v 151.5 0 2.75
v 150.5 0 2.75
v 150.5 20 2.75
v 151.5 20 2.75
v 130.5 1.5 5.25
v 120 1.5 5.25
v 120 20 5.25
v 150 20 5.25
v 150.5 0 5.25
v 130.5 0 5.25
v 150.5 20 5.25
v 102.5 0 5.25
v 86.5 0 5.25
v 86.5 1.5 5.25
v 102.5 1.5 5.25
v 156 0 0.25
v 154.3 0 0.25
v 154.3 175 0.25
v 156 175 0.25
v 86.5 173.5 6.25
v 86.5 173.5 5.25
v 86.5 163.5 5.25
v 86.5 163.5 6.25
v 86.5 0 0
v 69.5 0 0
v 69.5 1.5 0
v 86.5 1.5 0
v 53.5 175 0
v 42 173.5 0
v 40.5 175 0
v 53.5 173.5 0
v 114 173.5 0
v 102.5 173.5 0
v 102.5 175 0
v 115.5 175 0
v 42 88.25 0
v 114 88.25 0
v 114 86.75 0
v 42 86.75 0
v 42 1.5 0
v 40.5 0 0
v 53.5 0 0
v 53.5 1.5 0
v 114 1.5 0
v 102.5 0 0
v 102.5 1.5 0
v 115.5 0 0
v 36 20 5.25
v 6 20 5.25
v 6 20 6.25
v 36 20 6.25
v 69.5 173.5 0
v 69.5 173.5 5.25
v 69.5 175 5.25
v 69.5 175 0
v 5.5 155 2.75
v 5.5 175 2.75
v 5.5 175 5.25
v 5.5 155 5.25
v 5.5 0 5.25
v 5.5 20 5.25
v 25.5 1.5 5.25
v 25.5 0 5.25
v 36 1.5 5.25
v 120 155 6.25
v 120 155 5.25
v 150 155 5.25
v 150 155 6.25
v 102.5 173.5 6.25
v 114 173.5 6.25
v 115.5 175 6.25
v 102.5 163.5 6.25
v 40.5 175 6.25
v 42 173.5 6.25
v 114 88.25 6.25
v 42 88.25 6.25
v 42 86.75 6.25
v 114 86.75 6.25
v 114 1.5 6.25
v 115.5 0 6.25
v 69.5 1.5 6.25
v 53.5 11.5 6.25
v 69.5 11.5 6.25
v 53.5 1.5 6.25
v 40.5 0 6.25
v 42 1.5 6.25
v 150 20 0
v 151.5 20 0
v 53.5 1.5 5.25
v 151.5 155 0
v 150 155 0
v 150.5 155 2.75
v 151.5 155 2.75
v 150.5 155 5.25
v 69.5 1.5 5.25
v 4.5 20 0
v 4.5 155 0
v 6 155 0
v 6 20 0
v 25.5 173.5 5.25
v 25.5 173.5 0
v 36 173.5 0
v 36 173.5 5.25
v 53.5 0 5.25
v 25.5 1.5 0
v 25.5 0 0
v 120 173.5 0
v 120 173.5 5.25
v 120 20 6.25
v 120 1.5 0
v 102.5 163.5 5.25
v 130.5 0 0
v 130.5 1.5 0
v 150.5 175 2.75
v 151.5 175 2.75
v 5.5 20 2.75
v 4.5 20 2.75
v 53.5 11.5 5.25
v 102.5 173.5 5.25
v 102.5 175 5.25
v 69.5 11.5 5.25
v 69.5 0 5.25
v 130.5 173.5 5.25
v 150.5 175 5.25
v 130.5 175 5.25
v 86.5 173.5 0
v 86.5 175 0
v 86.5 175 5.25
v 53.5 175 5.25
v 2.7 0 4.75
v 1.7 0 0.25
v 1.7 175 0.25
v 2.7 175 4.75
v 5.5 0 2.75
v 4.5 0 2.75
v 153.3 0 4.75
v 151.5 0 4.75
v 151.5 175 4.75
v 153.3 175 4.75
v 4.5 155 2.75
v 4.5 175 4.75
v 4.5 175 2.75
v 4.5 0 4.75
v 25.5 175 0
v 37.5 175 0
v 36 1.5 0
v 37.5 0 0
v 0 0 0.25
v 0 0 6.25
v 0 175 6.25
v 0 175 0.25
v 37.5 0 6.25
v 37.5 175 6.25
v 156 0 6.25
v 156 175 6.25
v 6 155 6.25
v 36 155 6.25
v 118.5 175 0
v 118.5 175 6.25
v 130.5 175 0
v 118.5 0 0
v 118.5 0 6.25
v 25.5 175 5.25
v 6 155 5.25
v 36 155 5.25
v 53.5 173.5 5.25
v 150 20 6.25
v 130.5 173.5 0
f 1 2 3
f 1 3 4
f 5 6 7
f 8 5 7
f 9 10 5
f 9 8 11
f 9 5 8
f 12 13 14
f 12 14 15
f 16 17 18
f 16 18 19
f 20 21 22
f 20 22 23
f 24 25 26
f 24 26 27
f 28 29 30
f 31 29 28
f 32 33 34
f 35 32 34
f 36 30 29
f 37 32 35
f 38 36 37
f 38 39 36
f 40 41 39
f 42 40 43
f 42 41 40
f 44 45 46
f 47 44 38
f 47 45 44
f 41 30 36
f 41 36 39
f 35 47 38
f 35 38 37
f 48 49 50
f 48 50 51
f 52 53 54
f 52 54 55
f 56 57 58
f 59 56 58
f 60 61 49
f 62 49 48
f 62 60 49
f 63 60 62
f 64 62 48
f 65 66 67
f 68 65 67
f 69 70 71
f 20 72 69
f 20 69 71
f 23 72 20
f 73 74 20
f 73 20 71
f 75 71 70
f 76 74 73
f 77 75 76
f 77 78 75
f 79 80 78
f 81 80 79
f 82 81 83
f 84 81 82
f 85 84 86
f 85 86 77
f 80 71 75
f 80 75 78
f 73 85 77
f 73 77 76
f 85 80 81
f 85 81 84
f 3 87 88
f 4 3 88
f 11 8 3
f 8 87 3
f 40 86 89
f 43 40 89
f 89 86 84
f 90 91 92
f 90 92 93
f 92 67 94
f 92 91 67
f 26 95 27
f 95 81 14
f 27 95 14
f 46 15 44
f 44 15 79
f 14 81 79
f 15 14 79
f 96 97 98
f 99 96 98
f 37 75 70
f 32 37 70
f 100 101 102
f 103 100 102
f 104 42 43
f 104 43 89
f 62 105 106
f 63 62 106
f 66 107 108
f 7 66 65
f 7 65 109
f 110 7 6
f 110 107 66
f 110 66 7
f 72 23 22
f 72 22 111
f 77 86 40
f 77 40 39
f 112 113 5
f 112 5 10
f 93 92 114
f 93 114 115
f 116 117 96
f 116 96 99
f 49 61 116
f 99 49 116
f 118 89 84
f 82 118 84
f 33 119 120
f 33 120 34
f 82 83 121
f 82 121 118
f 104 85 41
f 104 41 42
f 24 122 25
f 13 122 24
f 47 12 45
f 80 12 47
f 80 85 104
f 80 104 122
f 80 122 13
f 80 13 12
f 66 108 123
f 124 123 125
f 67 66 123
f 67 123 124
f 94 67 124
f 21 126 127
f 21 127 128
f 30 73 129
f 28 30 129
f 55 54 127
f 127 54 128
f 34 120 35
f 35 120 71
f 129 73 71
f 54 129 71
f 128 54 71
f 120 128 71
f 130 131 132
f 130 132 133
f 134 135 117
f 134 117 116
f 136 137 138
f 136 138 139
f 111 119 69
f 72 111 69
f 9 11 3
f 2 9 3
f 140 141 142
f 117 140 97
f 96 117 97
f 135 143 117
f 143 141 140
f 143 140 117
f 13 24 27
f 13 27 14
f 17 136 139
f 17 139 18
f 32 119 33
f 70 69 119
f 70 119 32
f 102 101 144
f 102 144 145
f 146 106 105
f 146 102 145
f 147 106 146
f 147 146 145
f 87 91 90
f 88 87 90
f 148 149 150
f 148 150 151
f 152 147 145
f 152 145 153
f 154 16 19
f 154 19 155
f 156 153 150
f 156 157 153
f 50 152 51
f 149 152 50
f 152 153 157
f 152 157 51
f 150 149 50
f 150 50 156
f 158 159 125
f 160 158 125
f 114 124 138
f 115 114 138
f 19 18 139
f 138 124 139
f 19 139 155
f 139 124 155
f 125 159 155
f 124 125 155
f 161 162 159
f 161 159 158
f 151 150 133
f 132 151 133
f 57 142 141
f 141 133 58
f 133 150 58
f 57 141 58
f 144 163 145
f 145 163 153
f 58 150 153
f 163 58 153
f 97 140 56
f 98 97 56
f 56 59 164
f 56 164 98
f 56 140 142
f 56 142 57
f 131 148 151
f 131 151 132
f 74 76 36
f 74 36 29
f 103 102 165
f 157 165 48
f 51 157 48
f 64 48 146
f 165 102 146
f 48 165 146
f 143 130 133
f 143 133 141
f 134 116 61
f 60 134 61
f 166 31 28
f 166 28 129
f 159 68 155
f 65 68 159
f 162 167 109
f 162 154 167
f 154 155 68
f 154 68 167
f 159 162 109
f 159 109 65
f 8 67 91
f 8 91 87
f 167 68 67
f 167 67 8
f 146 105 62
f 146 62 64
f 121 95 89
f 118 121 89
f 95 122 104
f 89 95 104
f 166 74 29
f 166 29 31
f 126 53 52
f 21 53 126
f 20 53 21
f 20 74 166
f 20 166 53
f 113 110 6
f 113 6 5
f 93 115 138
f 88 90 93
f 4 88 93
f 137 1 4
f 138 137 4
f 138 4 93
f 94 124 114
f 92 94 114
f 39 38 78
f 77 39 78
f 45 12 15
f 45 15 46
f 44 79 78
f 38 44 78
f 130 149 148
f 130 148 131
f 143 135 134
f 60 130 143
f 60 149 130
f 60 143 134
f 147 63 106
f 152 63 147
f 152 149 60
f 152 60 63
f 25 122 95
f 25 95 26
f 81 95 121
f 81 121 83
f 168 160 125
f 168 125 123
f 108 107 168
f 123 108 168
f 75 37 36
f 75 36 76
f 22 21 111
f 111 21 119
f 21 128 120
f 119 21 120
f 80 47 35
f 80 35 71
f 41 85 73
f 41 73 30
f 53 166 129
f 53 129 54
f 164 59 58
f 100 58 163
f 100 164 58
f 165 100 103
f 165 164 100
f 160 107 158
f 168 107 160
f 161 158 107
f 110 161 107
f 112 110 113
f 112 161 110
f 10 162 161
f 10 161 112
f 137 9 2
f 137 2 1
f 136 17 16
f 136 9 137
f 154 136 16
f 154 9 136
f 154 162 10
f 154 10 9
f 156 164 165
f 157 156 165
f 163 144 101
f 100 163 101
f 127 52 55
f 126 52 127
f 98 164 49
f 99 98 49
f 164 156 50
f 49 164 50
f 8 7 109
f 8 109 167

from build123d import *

# Parameters (mm, degrees)
F1_DEPTH  = 175
F2_W      = 19.5
F2_H      = 135
F3_DEPTH  = 1.001
F4_W      = 0.5
F4_H      = 135
F5_DEPTH  = 5.25
F6_W      = 19.5
F6_H      = 135
F7_DEPTH  = 1.001
F8_W      = 0.5
F8_H      = 135
F9_DEPTH  = 5.25
F10_W     = 10.5
F10_H     = 135
F11_DEPTH = 6.251
F12_W     = 10.5
F12_H     = 18.5
F13_DEPTH = 5.25
F14_W     = 1
F14_H     = 20
F15_DEPTH = 2.75
F16_W     = 10.5
F16_H     = 135
F17_DEPTH = 6.251
F18_W     = 10.5
F18_H     = 18.5
F19_DEPTH = 5.25
F20_W     = 1
F20_H     = 20
F21_DEPTH = 2.75
F22_W     = 72
F22_H     = 172
F23_DEPTH = 6.251
F24_W     = 1.5
F24_H     = 6.25
F25_DEPTH = 72
F26_W     = 16
F26_H     = 1
F27_DEPTH = 10
F28_W     = 16
F28_H     = 1
F29_DEPTH = 10


with BuildPart() as f1:
    # F0 (on Front) → F1 (new body)
    with BuildSketch(Plane.XZ):
        Polygon((0, 6.25), (0, 0.25), (1.7, 0.25), (2.7, 4.75), (4.5, 4.75), (4.5, 0), (5.5, 0), (5.5, 5.25), (25.5, 5.25), (25.5, 0), (37.5, 0), (37.5, 6.25), align=None)
        Polygon((115.5, 6.25), (40.5, 6.25), (40.5, 0), (53.5, 0), (53.5, 5.25), (69.5, 5.25), (69.5, 0), (86.5, 0), (86.5, 5.25), (102.5, 5.25), (102.5, 0), (115.5, 0), align=None)
        Polygon((156, 0.25), (156, 6.25), (118.5, 6.25), (118.5, 0), (130.5, 0), (130.5, 5.25), (150.5, 5.25), (150.5, 0), (151.5, 0), (151.5, 4.75), (153.3, 4.75), (154.3, 0.25), align=None)
    extrude(amount=-F1_DEPTH)

    # F2 (on face) → F3 (cut, through all)
    with BuildSketch(Plane(origin=(0, 0, 5.25), x_dir=(1, 0, 0), z_dir=(0, 0, -1))):
        with Locations((15.75, -87.5)):
            Rectangle(F2_W, F2_H)
    extrude(amount=-F3_DEPTH, mode=Mode.SUBTRACT)

    # F4 (on face) → F5 (join)
    with BuildSketch(Plane(origin=(0, 0, 5.25), x_dir=(1, 0, 0), z_dir=(0, 0, -1))):
        with Locations((5.75, -87.5)):
            Rectangle(F4_W, F4_H)
    extrude(amount=F5_DEPTH)

    # F6 (on face) → F7 (cut, through all)
    with BuildSketch(Plane(origin=(0, 0, 5.25), x_dir=(1, 0, 0), z_dir=(0, 0, -1))):
        with Locations((140.25, -87.5)):
            Rectangle(F6_W, F6_H)
    extrude(amount=-F7_DEPTH, mode=Mode.SUBTRACT)

    # F8 (on face) → F9 (join)
    with BuildSketch(Plane(origin=(0, 0, 5.25), x_dir=(1, 0, 0), z_dir=(0, 0, -1))):
        with Locations((150.25, -87.5)):
            Rectangle(F8_W, F8_H)
    extrude(amount=F9_DEPTH)

    # F10 (on face) → F11 (cut, through all)
    with BuildSketch(Plane(origin=(0, 0, 0), x_dir=(1, 0, 0), z_dir=(0, 0, -1))):
        with Locations((30.75, -87.5)):
            Rectangle(F10_W, F10_H)
    extrude(amount=-F11_DEPTH, mode=Mode.SUBTRACT)

    # F12 (on face) → F13 (cut)
    with BuildSketch(Plane(origin=(0, 0, 0), x_dir=(1, 0, 0), z_dir=(0, 0, -1))):
        with Locations((30.75, -10.75)):
            Rectangle(F12_W, F12_H)
        with Locations((30.75, -164.25)):
            Rectangle(F12_W, F12_H)
    extrude(amount=-F13_DEPTH, mode=Mode.SUBTRACT)

    # F14 (on face) → F15 (cut)
    with BuildSketch(Plane(origin=(0, 0, 0), x_dir=(1, 0, 0), z_dir=(0, 0, -1))):
        with Locations((5, -10)):
            Rectangle(F14_W, F14_H)
        with Locations((5, -165)):
            Rectangle(F14_W, F14_H)
    extrude(amount=-F15_DEPTH, mode=Mode.SUBTRACT)

    # F16 (on face) → F17 (cut, through all)
    with BuildSketch(Plane(origin=(0, 0, 0), x_dir=(1, 0, 0), z_dir=(0, 0, -1))):
        with Locations((125.25, -87.5)):
            Rectangle(F16_W, F16_H)
    extrude(amount=-F17_DEPTH, mode=Mode.SUBTRACT)

    # F18 (on face) → F19 (cut)
    with BuildSketch(Plane(origin=(0, 0, 0), x_dir=(1, 0, 0), z_dir=(0, 0, -1))):
        with Locations((125.25, -10.75)):
            Rectangle(F18_W, F18_H)
        with Locations((125.25, -164.25)):
            Rectangle(F18_W, F18_H)
    extrude(amount=-F19_DEPTH, mode=Mode.SUBTRACT)

    # F20 (on face) → F21 (cut)
    with BuildSketch(Plane(origin=(0, 0, 0), x_dir=(1, 0, 0), z_dir=(0, 0, -1))):
        with Locations((151, -10)):
            Rectangle(F20_W, F20_H)
        with Locations((151, -165)):
            Rectangle(F20_W, F20_H)
    extrude(amount=-F21_DEPTH, mode=Mode.SUBTRACT)

    # F22 (on face) → F23 (cut, through all)
    with BuildSketch(Plane.XY.offset(6.25)):
        with Locations((78, 87.5)):
            Rectangle(F22_W, F22_H)
    extrude(amount=-F23_DEPTH, mode=Mode.SUBTRACT)

    # F24 (on face) → F25 (join, through all)
    with BuildSketch(Plane.YZ.offset(42)):
        with Locations((87.5, 3.125)):
            Rectangle(F24_W, F24_H)
    extrude(amount=F25_DEPTH)

    # F26 (on face) → F27 (join)
    with BuildSketch(Plane.XZ.offset(-173.5)):
        with Locations((94.5, 5.75)):
            Rectangle(F26_W, F26_H)
    extrude(amount=F27_DEPTH)

    # F28 (on face) → F29 (join)
    with BuildSketch(Plane(origin=(0, 1.5, 0), x_dir=(-1, 0, 0), z_dir=(0, 1, 0))):
        with Locations((-61.5, 5.75)):
            Rectangle(F28_W, F28_H)
    extrude(amount=F29_DEPTH)


solid = f1.part
